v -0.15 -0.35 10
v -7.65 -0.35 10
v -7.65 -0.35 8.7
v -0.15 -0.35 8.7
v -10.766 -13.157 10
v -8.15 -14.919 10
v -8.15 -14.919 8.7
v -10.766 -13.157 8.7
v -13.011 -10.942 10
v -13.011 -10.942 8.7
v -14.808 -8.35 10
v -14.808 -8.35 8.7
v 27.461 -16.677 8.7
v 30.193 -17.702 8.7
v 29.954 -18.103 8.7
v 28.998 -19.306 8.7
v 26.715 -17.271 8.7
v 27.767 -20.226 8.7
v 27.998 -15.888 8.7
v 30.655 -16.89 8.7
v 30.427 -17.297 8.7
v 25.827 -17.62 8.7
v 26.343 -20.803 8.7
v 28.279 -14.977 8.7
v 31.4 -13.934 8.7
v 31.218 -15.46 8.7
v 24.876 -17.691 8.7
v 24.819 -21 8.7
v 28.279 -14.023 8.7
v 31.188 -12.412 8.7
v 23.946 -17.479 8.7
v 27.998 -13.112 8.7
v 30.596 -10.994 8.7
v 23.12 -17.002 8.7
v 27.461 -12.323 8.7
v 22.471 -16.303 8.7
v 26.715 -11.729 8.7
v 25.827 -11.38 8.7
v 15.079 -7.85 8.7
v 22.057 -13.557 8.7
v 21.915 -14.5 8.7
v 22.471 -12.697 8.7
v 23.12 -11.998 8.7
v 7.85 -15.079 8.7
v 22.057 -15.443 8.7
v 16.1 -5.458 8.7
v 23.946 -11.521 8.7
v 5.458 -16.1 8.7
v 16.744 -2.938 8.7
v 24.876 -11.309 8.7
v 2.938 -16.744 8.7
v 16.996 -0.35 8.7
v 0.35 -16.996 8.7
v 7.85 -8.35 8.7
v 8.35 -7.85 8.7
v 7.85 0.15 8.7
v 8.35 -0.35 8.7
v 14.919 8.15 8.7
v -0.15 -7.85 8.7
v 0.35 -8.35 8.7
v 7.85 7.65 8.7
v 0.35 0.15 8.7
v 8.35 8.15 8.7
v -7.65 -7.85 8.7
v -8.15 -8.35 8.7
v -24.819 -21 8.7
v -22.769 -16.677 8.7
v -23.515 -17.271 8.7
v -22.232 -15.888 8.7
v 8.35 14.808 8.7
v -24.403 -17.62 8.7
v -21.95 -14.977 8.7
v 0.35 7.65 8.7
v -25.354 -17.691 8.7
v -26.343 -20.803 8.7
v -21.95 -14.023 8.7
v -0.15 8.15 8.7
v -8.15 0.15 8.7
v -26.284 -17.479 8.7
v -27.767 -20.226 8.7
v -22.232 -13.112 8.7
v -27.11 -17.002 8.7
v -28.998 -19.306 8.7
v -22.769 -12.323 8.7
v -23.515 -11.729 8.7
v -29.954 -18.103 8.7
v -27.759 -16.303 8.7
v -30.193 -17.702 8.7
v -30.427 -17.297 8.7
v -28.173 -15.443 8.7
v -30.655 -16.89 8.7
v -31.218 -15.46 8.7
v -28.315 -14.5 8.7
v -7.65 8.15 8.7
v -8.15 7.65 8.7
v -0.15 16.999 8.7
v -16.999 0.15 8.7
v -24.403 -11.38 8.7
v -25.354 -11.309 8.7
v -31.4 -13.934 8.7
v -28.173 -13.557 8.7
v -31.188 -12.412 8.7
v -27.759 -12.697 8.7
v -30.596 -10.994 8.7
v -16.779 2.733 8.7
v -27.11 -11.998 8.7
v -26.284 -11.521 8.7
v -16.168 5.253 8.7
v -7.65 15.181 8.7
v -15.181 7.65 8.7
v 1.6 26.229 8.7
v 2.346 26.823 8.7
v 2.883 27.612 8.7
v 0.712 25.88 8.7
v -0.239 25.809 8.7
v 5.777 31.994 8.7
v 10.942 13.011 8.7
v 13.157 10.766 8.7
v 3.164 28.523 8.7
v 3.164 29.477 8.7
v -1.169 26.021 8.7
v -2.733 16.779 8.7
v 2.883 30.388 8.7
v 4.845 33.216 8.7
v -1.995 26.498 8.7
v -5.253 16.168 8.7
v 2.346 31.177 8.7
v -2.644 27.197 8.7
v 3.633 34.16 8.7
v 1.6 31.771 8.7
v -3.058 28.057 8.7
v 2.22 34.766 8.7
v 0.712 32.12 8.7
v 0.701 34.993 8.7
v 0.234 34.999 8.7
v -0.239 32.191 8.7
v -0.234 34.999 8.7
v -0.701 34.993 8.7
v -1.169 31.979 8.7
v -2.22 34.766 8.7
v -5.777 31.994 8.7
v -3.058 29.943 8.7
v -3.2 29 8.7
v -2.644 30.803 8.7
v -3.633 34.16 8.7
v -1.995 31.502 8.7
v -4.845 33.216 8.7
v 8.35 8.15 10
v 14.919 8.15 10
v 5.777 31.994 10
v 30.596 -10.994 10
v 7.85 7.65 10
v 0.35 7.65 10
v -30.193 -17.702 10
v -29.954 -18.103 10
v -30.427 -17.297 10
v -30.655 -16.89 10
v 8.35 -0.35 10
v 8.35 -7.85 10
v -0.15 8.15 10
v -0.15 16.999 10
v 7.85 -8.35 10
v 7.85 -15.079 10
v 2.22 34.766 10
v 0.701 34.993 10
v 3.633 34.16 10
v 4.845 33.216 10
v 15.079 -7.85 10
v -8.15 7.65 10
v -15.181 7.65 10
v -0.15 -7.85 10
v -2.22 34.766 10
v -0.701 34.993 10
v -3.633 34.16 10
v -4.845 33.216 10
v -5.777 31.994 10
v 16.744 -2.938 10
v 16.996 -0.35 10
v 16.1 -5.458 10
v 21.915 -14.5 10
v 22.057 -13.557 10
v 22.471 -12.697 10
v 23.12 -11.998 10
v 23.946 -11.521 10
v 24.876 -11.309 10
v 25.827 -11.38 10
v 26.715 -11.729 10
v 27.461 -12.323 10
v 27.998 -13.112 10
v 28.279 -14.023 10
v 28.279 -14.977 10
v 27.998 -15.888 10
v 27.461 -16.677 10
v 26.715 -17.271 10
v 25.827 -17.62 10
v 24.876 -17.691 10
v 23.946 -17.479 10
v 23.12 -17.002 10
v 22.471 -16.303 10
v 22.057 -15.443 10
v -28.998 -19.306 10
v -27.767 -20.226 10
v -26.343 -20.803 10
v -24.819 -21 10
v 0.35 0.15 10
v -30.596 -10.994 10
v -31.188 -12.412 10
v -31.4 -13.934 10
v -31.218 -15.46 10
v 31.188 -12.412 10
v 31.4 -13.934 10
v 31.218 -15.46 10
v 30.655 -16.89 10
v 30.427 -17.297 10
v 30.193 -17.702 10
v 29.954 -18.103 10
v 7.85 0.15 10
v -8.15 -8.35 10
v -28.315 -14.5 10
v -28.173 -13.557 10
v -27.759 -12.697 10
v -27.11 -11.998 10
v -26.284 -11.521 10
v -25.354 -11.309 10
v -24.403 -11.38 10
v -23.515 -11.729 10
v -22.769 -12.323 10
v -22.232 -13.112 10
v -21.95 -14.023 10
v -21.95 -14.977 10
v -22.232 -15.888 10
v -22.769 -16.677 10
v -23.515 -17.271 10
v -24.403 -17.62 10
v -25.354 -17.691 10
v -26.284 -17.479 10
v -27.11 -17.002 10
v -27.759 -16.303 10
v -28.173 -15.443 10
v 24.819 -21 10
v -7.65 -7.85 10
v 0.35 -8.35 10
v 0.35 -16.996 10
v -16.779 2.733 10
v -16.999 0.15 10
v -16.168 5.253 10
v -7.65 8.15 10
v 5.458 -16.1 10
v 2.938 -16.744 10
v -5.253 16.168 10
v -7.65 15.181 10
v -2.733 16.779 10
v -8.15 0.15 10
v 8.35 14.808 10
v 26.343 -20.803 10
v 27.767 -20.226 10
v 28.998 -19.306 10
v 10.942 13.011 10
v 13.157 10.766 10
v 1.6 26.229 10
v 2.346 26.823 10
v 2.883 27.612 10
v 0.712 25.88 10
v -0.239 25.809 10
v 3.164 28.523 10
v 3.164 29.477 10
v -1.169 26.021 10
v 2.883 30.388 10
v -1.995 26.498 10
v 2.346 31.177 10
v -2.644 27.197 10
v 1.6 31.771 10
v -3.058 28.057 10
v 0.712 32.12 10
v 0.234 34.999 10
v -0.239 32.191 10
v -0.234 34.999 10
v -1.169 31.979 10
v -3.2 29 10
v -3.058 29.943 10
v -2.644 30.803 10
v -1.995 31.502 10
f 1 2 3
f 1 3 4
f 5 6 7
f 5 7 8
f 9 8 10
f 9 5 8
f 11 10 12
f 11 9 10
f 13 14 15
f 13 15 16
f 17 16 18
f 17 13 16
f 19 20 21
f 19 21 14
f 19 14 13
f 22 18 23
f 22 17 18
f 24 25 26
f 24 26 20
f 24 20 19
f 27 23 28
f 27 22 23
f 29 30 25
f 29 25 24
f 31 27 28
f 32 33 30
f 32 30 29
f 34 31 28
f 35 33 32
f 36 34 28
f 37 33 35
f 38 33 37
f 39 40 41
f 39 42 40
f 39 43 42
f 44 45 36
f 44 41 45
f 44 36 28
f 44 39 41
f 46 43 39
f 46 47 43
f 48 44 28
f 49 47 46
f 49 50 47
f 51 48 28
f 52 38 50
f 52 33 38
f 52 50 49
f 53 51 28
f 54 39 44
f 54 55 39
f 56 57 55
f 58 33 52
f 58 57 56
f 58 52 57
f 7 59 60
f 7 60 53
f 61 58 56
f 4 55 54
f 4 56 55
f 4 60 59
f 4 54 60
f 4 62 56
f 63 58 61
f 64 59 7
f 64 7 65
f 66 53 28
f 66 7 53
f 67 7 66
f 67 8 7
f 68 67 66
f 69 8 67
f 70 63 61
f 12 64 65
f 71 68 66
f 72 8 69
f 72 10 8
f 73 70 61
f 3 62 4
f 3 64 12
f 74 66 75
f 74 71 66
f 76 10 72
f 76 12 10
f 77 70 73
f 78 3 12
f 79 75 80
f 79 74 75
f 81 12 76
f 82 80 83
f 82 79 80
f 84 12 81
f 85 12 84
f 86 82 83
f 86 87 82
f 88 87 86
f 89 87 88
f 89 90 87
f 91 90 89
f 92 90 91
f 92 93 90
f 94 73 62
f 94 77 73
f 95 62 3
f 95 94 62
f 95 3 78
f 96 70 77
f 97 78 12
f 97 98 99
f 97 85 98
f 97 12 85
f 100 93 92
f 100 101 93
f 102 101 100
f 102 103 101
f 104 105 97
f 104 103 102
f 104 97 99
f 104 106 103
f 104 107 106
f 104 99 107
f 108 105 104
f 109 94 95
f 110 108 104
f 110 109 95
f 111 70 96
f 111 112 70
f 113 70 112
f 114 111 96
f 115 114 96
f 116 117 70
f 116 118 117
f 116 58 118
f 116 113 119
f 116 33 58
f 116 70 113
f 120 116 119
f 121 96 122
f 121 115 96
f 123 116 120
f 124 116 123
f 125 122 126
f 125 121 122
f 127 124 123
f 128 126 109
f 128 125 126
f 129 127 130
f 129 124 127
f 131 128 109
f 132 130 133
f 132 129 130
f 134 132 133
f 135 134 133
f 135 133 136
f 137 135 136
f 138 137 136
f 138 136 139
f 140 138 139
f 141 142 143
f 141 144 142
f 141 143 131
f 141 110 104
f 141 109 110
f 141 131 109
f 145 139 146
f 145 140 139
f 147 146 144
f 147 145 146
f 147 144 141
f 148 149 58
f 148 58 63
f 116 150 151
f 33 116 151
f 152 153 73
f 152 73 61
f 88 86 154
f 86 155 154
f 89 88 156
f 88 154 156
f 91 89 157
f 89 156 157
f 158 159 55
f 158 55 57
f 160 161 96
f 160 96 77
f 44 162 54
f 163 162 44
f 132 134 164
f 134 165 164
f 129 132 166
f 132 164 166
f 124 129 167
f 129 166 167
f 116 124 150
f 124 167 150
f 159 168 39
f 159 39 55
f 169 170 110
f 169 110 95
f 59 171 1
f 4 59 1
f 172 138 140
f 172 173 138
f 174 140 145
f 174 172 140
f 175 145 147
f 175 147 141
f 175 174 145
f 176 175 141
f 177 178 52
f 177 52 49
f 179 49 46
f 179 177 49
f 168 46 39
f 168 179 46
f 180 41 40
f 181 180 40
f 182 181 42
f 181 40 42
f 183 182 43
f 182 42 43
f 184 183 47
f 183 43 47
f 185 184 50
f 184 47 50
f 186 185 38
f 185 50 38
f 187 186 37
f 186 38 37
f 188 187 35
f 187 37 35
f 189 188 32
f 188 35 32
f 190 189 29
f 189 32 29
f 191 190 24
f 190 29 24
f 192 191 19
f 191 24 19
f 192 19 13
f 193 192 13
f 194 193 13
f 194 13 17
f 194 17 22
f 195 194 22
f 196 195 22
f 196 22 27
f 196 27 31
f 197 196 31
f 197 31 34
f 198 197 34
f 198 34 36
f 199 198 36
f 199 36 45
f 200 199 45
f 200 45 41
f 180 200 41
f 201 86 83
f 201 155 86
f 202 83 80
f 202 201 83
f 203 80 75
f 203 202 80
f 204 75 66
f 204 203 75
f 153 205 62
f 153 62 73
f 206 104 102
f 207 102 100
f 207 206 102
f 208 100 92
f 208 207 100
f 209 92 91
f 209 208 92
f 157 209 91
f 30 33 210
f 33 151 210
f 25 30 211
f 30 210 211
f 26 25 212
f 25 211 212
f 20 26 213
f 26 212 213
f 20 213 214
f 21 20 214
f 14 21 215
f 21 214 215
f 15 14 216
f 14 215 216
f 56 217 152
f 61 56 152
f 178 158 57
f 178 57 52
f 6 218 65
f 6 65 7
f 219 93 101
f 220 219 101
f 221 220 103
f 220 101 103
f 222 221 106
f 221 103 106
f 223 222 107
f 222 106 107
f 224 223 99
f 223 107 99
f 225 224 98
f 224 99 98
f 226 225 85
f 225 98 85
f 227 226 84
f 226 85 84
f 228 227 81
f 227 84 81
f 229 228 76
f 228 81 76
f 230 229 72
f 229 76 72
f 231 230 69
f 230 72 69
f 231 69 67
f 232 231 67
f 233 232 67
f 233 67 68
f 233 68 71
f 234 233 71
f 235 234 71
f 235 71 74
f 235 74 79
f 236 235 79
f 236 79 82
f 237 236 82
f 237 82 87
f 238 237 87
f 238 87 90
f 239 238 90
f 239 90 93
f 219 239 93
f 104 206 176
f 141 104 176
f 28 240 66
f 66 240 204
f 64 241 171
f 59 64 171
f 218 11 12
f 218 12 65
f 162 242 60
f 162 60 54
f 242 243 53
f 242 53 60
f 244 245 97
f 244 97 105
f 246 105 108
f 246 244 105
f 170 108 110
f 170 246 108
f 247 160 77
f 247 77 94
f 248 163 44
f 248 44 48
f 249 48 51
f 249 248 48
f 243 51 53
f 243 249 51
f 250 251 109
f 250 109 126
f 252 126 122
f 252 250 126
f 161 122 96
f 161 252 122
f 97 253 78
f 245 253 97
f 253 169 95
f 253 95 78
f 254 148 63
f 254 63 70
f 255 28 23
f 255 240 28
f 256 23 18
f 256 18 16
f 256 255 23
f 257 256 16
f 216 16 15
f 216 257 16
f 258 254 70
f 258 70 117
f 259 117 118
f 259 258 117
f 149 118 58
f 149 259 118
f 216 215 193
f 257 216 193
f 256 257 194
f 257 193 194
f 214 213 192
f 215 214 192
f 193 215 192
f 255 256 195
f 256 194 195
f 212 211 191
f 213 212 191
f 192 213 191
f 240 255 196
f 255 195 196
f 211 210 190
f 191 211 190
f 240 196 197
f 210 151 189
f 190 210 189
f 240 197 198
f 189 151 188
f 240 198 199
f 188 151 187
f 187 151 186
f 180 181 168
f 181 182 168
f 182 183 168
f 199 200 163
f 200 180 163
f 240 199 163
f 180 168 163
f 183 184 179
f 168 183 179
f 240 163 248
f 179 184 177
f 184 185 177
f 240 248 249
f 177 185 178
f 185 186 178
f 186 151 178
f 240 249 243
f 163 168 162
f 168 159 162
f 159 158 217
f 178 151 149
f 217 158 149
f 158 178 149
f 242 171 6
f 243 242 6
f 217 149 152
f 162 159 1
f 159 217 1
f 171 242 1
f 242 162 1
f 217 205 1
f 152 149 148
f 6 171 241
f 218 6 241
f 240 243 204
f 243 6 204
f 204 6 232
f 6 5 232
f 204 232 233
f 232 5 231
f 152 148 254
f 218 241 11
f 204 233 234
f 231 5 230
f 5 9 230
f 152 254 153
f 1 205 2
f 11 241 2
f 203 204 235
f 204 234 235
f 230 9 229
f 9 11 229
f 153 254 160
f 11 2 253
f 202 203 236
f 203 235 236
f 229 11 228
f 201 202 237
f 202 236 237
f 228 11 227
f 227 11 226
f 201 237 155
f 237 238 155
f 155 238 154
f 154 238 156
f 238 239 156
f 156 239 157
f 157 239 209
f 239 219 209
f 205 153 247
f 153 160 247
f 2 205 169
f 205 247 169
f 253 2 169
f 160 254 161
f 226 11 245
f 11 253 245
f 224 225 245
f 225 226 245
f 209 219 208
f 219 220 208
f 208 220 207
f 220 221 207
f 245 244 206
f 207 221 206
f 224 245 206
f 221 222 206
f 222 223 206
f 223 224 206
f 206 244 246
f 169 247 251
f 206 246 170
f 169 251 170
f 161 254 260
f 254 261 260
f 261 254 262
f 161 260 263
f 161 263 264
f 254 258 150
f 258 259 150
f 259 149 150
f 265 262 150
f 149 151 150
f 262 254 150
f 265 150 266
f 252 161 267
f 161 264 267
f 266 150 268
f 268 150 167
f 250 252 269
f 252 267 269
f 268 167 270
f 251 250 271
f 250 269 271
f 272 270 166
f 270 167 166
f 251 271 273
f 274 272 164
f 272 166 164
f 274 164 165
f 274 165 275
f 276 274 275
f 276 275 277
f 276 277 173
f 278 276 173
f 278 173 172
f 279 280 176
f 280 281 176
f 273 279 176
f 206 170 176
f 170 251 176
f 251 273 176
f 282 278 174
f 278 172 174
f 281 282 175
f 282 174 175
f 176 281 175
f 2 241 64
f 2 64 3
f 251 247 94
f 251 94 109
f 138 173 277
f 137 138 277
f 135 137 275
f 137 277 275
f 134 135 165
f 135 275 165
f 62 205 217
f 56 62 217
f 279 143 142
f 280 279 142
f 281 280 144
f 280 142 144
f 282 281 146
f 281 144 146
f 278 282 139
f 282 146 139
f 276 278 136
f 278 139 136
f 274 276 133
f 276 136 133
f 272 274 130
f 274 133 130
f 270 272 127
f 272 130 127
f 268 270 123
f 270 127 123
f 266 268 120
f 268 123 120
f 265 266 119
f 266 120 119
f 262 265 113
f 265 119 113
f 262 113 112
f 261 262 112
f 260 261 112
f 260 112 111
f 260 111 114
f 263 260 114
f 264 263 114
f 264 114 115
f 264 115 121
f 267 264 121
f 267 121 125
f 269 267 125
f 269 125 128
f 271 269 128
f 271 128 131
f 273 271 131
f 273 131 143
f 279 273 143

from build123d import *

# Parameters (mm, degrees)
SKETCH2_R               = 18
SKETCH2_W               = 7.5
SKETCH2_H               = 7.5
BOSS_EXTRUDE1_DEPTH     = 1.3
BOSS_EXTRUDE10_START    = 1.3
SKETCH18_W              = 7.7
SKETCH18_H              = 7.7
BOSS_EXTRUDE10_DEPTH    = 1.3
BOSS_EXTRUDE2_START     = -1.3
SKETCH3_R               = 35
SKETCH3_R_2             = 18
BOSS_EXTRUDE2_DEPTH     = 1.3
CUT_EXTRUDE1_DEPTH      = 50.514543318
CUT_EXTRUDE1_DEPTH_BACK = 50.514543318
SKETCH7_R               = 59.131365533
FILLET1_R               = 6
SKETCH4_R               = 3.2
CUT_EXTRUDE2_DEPTH      = 10


with BuildPart() as part:
    # Sketch2 → Boss-Extrude1 (new body)
    with BuildSketch(Plane.XY.offset(10)):
        Circle(SKETCH2_R)
        with BuildLine():
            Line((-8.15, -8.35), (-8.15, -14.91903147))
            ThreePointArc((-8.15, -14.91903147), (-11.939670478, -12.101415986), (-14.808021475, -8.35))
            Line((-14.808021475, -8.35), (-8.15, -8.35))
        make_face(mode=Mode.SUBTRACT)
        with BuildLine():
            Line((-8.15, -7.85), (-15.079041747, -7.85))
            ThreePointArc((-15.079041747, -7.85), (-16.470304718, -4.210589327), (-16.996396677, -0.35))
            Line((-16.996396677, -0.35), (-8.15, -0.35))
            Line((-8.15, -0.35), (-8.15, -7.85))
        make_face(mode=Mode.SUBTRACT)
        with BuildLine():
            Line((-8.15, 0.15), (-16.999338222, 0.15))
            ThreePointArc((-16.999338222, 0.15), (-16.521617742, 4.00451585), (-15.181485435, 7.65))
            Line((-15.181485435, 7.65), (-8.15, 7.65))
            Line((-8.15, 7.65), (-8.15, 0.15))
        make_face(mode=Mode.SUBTRACT)
        with BuildLine():
            Line((-8.15, 8.15), (-14.91903147, 8.15))
            ThreePointArc((-14.91903147, 8.15), (-12.02081528, 12.02081528), (-8.15, 14.91903147))
            Line((-8.15, 14.91903147), (-8.15, 8.15))
        make_face(mode=Mode.SUBTRACT)
        with BuildLine():
            Line((-7.65, 8.15), (-7.65, 15.181485435))
            ThreePointArc((-7.65, 15.181485435), (-4.00451585, 16.521617742), (-0.15, 16.999338222))
            Line((-0.15, 16.999338222), (-0.15, 8.15))
            Line((-0.15, 8.15), (-7.65, 8.15))
        make_face(mode=Mode.SUBTRACT)
        with BuildLine():
            Line((0.35, 8.15), (0.35, 16.996396677))
            ThreePointArc((0.35, 16.996396677), (4.210589327, 16.470304718), (7.85, 15.079041747))
            Line((7.85, 15.079041747), (7.85, 8.15))
            Line((7.85, 8.15), (0.35, 8.15))
        make_face(mode=Mode.SUBTRACT)
        with BuildLine():
            Line((8.35, 8.15), (8.35, 14.808021475))
            ThreePointArc((8.35, 14.808021475), (12.101415986, 11.939670478), (14.91903147, 8.15))
            Line((14.91903147, 8.15), (8.35, 8.15))
        make_face(mode=Mode.SUBTRACT)
        with BuildLine():
            Line((8.35, 7.65), (15.181485435, 7.65))
            ThreePointArc((15.181485435, 7.65), (16.521617742, 4.00451585), (16.999338222, 0.15))
            Line((16.999338222, 0.15), (8.35, 0.15))
            Line((8.35, 0.15), (8.35, 7.65))
        make_face(mode=Mode.SUBTRACT)
        with BuildLine():
            Line((8.35, -0.35), (16.996396677, -0.35))
            ThreePointArc((16.996396677, -0.35), (16.470304718, -4.210589327), (15.079041747, -7.85))
            Line((15.079041747, -7.85), (8.35, -7.85))
            Line((8.35, -7.85), (8.35, -0.35))
        make_face(mode=Mode.SUBTRACT)
        with BuildLine():
            Line((8.35, -8.35), (14.808021475, -8.35))
            ThreePointArc((14.808021475, -8.35), (12.02081528, -12.02081528), (8.35, -14.808021475))
            Line((8.35, -14.808021475), (8.35, -8.35))
        make_face(mode=Mode.SUBTRACT)
        with BuildLine():
            Line((7.85, -8.35), (7.85, -15.079041747))
            ThreePointArc((7.85, -15.079041747), (4.210589327, -16.470304718), (0.35, -16.996396677))
            Line((0.35, -16.996396677), (0.35, -8.35))
            Line((0.35, -8.35), (7.85, -8.35))
        make_face(mode=Mode.SUBTRACT)
        with BuildLine():
            Line((-0.15, -8.35), (-0.15, -16.999338222))
            ThreePointArc((-0.15, -16.999338222), (-4.00451585, -16.521617742), (-7.65, -15.181485435))
            Line((-7.65, -15.181485435), (-7.65, -8.35))
            Line((-7.65, -8.35), (-0.15, -8.35))
        make_face(mode=Mode.SUBTRACT)
        with Locations((-3.9, -4.1)):
            Rectangle(SKETCH2_W, SKETCH2_H, mode=Mode.SUBTRACT)
        with Locations((4.1, -4.1)):
            Rectangle(SKETCH2_W, SKETCH2_H, mode=Mode.SUBTRACT)
        with Locations((-3.9, 3.9)):
            Rectangle(SKETCH2_W, SKETCH2_H, mode=Mode.SUBTRACT)
        with Locations((4.1, 3.9)):
            Rectangle(SKETCH2_W, SKETCH2_H, mode=Mode.SUBTRACT)
    extrude(amount=-BOSS_EXTRUDE1_DEPTH)

    # Sketch18 → Boss-Extrude10 (add)
    with BuildSketch(Plane.XY.offset(8.7).offset(BOSS_EXTRUDE10_START)):
        with BuildLine():
            ThreePointArc((7.85, 15.079041747), (4.11362184, 16.494790552), (0.15, 16.999338222))
            Line((0.15, 16.999338222), (0.15, 8.15))
            Line((0.15, 8.15), (7.85, 8.15))
            Line((7.85, 8.15), (7.85, 15.079041747))
        make_face()
        with BuildLine():
            Line((8.15, 0.15), (16.999338222, 0.15))
            ThreePointArc((16.999338222, 0.15), (16.494790552, 4.11362184), (15.079041747, 7.85))
            Line((15.079041747, 7.85), (8.15, 7.85))
            Line((8.15, 7.85), (8.15, 0.15))
        make_face()
        with Locations((-4, 4)):
            Rectangle(SKETCH18_W, SKETCH18_H)
        with Locations((4, -4)):
            Rectangle(SKETCH18_W, SKETCH18_H)
        with BuildLine():
            Line((8.15, -8.15), (8.15, -14.91903147))
            ThreePointArc((8.15, -14.91903147), (12.02081528, -12.02081528), (14.91903147, -8.15))
            Line((14.91903147, -8.15), (8.15, -8.15))
        make_face()
        with BuildLine():
            Line((-7.85, -8.15), (-7.85, -15.079041747))
            ThreePointArc((-7.85, -15.079041747), (-4.11362184, -16.494790552), (-0.15, -16.999338222))
            Line((-0.15, -16.999338222), (-0.15, -8.15))
            Line((-0.15, -8.15), (-7.85, -8.15))
        make_face()
        with BuildLine():
            ThreePointArc((-16.999338222, -0.15), (-16.494790552, -4.11362184), (-15.079041747, -7.85))
            Line((-15.079041747, -7.85), (-8.15, -7.85))
            Line((-8.15, -7.85), (-8.15, -0.15))
            Line((-8.15, -0.15), (-16.999338222, -0.15))
        make_face()
        with BuildLine():
            ThreePointArc((-8.15, 14.91903147), (-12.02081528, 12.02081528), (-14.91903147, 8.15))
            Line((-14.91903147, 8.15), (-8.15, 8.15))
            Line((-8.15, 8.15), (-8.15, 14.91903147))
        make_face()
    extrude(amount=-BOSS_EXTRUDE10_DEPTH)

    # Sketch3 → Boss-Extrude2 (add)
    with BuildSketch(Plane(origin=(0, 0, 8.7), x_dir=(-1, 0, 0), z_dir=(0, 0, -1)).offset(BOSS_EXTRUDE2_START)):
        Circle(SKETCH3_R)
        Circle(SKETCH3_R_2, mode=Mode.SUBTRACT)
    extrude(amount=BOSS_EXTRUDE2_DEPTH)

    # Sketch7 → Cut-Extrude1 (cut, two sides: drawn at the far end of the back side and taken through both)
    with BuildSketch(Plane(origin=(0, 0, 8.7), x_dir=(-1, 0, 0), z_dir=(0, 0, -1)).offset(-CUT_EXTRUDE1_DEPTH_BACK)):
        Circle(SKETCH7_R)
        Polygon((0, 42), (-36.373066959, -21), (36.373066959, -21), align=None, mode=Mode.SUBTRACT)
    extrude(amount=CUT_EXTRUDE1_DEPTH + CUT_EXTRUDE1_DEPTH_BACK, mode=Mode.SUBTRACT)

    # Fillet1
    fillet1_edges = [part.edges().sort_by_distance(p)[0] for p in [
        (4.186533479, 34.748711306, 9.35),
        (32.186533479, -13.748711306, 9.35),
        (28, -21, 9.35),
        (-28, -21, 9.35),
        (-32.186533479, -13.748711306, 9.35),
        (-4.186533479, 34.748711306, 9.35),
    ]]
    fillet(fillet1_edges, radius=FILLET1_R)

    # Sketch4 → Cut-Extrude2 (cut)
    with BuildSketch(Plane(origin=(0, 0, 8.7), x_dir=(-1, 0, 0), z_dir=(0, 0, -1))):
        with Locations((0, 29)):
            Circle(SKETCH4_R)
        with Locations((25.11473671, -14.5)):
            Circle(SKETCH4_R)
        with Locations((-25.11473671, -14.5)):
            Circle(SKETCH4_R)
    extrude(amount=-CUT_EXTRUDE2_DEPTH, mode=Mode.SUBTRACT)


solid = part.part
